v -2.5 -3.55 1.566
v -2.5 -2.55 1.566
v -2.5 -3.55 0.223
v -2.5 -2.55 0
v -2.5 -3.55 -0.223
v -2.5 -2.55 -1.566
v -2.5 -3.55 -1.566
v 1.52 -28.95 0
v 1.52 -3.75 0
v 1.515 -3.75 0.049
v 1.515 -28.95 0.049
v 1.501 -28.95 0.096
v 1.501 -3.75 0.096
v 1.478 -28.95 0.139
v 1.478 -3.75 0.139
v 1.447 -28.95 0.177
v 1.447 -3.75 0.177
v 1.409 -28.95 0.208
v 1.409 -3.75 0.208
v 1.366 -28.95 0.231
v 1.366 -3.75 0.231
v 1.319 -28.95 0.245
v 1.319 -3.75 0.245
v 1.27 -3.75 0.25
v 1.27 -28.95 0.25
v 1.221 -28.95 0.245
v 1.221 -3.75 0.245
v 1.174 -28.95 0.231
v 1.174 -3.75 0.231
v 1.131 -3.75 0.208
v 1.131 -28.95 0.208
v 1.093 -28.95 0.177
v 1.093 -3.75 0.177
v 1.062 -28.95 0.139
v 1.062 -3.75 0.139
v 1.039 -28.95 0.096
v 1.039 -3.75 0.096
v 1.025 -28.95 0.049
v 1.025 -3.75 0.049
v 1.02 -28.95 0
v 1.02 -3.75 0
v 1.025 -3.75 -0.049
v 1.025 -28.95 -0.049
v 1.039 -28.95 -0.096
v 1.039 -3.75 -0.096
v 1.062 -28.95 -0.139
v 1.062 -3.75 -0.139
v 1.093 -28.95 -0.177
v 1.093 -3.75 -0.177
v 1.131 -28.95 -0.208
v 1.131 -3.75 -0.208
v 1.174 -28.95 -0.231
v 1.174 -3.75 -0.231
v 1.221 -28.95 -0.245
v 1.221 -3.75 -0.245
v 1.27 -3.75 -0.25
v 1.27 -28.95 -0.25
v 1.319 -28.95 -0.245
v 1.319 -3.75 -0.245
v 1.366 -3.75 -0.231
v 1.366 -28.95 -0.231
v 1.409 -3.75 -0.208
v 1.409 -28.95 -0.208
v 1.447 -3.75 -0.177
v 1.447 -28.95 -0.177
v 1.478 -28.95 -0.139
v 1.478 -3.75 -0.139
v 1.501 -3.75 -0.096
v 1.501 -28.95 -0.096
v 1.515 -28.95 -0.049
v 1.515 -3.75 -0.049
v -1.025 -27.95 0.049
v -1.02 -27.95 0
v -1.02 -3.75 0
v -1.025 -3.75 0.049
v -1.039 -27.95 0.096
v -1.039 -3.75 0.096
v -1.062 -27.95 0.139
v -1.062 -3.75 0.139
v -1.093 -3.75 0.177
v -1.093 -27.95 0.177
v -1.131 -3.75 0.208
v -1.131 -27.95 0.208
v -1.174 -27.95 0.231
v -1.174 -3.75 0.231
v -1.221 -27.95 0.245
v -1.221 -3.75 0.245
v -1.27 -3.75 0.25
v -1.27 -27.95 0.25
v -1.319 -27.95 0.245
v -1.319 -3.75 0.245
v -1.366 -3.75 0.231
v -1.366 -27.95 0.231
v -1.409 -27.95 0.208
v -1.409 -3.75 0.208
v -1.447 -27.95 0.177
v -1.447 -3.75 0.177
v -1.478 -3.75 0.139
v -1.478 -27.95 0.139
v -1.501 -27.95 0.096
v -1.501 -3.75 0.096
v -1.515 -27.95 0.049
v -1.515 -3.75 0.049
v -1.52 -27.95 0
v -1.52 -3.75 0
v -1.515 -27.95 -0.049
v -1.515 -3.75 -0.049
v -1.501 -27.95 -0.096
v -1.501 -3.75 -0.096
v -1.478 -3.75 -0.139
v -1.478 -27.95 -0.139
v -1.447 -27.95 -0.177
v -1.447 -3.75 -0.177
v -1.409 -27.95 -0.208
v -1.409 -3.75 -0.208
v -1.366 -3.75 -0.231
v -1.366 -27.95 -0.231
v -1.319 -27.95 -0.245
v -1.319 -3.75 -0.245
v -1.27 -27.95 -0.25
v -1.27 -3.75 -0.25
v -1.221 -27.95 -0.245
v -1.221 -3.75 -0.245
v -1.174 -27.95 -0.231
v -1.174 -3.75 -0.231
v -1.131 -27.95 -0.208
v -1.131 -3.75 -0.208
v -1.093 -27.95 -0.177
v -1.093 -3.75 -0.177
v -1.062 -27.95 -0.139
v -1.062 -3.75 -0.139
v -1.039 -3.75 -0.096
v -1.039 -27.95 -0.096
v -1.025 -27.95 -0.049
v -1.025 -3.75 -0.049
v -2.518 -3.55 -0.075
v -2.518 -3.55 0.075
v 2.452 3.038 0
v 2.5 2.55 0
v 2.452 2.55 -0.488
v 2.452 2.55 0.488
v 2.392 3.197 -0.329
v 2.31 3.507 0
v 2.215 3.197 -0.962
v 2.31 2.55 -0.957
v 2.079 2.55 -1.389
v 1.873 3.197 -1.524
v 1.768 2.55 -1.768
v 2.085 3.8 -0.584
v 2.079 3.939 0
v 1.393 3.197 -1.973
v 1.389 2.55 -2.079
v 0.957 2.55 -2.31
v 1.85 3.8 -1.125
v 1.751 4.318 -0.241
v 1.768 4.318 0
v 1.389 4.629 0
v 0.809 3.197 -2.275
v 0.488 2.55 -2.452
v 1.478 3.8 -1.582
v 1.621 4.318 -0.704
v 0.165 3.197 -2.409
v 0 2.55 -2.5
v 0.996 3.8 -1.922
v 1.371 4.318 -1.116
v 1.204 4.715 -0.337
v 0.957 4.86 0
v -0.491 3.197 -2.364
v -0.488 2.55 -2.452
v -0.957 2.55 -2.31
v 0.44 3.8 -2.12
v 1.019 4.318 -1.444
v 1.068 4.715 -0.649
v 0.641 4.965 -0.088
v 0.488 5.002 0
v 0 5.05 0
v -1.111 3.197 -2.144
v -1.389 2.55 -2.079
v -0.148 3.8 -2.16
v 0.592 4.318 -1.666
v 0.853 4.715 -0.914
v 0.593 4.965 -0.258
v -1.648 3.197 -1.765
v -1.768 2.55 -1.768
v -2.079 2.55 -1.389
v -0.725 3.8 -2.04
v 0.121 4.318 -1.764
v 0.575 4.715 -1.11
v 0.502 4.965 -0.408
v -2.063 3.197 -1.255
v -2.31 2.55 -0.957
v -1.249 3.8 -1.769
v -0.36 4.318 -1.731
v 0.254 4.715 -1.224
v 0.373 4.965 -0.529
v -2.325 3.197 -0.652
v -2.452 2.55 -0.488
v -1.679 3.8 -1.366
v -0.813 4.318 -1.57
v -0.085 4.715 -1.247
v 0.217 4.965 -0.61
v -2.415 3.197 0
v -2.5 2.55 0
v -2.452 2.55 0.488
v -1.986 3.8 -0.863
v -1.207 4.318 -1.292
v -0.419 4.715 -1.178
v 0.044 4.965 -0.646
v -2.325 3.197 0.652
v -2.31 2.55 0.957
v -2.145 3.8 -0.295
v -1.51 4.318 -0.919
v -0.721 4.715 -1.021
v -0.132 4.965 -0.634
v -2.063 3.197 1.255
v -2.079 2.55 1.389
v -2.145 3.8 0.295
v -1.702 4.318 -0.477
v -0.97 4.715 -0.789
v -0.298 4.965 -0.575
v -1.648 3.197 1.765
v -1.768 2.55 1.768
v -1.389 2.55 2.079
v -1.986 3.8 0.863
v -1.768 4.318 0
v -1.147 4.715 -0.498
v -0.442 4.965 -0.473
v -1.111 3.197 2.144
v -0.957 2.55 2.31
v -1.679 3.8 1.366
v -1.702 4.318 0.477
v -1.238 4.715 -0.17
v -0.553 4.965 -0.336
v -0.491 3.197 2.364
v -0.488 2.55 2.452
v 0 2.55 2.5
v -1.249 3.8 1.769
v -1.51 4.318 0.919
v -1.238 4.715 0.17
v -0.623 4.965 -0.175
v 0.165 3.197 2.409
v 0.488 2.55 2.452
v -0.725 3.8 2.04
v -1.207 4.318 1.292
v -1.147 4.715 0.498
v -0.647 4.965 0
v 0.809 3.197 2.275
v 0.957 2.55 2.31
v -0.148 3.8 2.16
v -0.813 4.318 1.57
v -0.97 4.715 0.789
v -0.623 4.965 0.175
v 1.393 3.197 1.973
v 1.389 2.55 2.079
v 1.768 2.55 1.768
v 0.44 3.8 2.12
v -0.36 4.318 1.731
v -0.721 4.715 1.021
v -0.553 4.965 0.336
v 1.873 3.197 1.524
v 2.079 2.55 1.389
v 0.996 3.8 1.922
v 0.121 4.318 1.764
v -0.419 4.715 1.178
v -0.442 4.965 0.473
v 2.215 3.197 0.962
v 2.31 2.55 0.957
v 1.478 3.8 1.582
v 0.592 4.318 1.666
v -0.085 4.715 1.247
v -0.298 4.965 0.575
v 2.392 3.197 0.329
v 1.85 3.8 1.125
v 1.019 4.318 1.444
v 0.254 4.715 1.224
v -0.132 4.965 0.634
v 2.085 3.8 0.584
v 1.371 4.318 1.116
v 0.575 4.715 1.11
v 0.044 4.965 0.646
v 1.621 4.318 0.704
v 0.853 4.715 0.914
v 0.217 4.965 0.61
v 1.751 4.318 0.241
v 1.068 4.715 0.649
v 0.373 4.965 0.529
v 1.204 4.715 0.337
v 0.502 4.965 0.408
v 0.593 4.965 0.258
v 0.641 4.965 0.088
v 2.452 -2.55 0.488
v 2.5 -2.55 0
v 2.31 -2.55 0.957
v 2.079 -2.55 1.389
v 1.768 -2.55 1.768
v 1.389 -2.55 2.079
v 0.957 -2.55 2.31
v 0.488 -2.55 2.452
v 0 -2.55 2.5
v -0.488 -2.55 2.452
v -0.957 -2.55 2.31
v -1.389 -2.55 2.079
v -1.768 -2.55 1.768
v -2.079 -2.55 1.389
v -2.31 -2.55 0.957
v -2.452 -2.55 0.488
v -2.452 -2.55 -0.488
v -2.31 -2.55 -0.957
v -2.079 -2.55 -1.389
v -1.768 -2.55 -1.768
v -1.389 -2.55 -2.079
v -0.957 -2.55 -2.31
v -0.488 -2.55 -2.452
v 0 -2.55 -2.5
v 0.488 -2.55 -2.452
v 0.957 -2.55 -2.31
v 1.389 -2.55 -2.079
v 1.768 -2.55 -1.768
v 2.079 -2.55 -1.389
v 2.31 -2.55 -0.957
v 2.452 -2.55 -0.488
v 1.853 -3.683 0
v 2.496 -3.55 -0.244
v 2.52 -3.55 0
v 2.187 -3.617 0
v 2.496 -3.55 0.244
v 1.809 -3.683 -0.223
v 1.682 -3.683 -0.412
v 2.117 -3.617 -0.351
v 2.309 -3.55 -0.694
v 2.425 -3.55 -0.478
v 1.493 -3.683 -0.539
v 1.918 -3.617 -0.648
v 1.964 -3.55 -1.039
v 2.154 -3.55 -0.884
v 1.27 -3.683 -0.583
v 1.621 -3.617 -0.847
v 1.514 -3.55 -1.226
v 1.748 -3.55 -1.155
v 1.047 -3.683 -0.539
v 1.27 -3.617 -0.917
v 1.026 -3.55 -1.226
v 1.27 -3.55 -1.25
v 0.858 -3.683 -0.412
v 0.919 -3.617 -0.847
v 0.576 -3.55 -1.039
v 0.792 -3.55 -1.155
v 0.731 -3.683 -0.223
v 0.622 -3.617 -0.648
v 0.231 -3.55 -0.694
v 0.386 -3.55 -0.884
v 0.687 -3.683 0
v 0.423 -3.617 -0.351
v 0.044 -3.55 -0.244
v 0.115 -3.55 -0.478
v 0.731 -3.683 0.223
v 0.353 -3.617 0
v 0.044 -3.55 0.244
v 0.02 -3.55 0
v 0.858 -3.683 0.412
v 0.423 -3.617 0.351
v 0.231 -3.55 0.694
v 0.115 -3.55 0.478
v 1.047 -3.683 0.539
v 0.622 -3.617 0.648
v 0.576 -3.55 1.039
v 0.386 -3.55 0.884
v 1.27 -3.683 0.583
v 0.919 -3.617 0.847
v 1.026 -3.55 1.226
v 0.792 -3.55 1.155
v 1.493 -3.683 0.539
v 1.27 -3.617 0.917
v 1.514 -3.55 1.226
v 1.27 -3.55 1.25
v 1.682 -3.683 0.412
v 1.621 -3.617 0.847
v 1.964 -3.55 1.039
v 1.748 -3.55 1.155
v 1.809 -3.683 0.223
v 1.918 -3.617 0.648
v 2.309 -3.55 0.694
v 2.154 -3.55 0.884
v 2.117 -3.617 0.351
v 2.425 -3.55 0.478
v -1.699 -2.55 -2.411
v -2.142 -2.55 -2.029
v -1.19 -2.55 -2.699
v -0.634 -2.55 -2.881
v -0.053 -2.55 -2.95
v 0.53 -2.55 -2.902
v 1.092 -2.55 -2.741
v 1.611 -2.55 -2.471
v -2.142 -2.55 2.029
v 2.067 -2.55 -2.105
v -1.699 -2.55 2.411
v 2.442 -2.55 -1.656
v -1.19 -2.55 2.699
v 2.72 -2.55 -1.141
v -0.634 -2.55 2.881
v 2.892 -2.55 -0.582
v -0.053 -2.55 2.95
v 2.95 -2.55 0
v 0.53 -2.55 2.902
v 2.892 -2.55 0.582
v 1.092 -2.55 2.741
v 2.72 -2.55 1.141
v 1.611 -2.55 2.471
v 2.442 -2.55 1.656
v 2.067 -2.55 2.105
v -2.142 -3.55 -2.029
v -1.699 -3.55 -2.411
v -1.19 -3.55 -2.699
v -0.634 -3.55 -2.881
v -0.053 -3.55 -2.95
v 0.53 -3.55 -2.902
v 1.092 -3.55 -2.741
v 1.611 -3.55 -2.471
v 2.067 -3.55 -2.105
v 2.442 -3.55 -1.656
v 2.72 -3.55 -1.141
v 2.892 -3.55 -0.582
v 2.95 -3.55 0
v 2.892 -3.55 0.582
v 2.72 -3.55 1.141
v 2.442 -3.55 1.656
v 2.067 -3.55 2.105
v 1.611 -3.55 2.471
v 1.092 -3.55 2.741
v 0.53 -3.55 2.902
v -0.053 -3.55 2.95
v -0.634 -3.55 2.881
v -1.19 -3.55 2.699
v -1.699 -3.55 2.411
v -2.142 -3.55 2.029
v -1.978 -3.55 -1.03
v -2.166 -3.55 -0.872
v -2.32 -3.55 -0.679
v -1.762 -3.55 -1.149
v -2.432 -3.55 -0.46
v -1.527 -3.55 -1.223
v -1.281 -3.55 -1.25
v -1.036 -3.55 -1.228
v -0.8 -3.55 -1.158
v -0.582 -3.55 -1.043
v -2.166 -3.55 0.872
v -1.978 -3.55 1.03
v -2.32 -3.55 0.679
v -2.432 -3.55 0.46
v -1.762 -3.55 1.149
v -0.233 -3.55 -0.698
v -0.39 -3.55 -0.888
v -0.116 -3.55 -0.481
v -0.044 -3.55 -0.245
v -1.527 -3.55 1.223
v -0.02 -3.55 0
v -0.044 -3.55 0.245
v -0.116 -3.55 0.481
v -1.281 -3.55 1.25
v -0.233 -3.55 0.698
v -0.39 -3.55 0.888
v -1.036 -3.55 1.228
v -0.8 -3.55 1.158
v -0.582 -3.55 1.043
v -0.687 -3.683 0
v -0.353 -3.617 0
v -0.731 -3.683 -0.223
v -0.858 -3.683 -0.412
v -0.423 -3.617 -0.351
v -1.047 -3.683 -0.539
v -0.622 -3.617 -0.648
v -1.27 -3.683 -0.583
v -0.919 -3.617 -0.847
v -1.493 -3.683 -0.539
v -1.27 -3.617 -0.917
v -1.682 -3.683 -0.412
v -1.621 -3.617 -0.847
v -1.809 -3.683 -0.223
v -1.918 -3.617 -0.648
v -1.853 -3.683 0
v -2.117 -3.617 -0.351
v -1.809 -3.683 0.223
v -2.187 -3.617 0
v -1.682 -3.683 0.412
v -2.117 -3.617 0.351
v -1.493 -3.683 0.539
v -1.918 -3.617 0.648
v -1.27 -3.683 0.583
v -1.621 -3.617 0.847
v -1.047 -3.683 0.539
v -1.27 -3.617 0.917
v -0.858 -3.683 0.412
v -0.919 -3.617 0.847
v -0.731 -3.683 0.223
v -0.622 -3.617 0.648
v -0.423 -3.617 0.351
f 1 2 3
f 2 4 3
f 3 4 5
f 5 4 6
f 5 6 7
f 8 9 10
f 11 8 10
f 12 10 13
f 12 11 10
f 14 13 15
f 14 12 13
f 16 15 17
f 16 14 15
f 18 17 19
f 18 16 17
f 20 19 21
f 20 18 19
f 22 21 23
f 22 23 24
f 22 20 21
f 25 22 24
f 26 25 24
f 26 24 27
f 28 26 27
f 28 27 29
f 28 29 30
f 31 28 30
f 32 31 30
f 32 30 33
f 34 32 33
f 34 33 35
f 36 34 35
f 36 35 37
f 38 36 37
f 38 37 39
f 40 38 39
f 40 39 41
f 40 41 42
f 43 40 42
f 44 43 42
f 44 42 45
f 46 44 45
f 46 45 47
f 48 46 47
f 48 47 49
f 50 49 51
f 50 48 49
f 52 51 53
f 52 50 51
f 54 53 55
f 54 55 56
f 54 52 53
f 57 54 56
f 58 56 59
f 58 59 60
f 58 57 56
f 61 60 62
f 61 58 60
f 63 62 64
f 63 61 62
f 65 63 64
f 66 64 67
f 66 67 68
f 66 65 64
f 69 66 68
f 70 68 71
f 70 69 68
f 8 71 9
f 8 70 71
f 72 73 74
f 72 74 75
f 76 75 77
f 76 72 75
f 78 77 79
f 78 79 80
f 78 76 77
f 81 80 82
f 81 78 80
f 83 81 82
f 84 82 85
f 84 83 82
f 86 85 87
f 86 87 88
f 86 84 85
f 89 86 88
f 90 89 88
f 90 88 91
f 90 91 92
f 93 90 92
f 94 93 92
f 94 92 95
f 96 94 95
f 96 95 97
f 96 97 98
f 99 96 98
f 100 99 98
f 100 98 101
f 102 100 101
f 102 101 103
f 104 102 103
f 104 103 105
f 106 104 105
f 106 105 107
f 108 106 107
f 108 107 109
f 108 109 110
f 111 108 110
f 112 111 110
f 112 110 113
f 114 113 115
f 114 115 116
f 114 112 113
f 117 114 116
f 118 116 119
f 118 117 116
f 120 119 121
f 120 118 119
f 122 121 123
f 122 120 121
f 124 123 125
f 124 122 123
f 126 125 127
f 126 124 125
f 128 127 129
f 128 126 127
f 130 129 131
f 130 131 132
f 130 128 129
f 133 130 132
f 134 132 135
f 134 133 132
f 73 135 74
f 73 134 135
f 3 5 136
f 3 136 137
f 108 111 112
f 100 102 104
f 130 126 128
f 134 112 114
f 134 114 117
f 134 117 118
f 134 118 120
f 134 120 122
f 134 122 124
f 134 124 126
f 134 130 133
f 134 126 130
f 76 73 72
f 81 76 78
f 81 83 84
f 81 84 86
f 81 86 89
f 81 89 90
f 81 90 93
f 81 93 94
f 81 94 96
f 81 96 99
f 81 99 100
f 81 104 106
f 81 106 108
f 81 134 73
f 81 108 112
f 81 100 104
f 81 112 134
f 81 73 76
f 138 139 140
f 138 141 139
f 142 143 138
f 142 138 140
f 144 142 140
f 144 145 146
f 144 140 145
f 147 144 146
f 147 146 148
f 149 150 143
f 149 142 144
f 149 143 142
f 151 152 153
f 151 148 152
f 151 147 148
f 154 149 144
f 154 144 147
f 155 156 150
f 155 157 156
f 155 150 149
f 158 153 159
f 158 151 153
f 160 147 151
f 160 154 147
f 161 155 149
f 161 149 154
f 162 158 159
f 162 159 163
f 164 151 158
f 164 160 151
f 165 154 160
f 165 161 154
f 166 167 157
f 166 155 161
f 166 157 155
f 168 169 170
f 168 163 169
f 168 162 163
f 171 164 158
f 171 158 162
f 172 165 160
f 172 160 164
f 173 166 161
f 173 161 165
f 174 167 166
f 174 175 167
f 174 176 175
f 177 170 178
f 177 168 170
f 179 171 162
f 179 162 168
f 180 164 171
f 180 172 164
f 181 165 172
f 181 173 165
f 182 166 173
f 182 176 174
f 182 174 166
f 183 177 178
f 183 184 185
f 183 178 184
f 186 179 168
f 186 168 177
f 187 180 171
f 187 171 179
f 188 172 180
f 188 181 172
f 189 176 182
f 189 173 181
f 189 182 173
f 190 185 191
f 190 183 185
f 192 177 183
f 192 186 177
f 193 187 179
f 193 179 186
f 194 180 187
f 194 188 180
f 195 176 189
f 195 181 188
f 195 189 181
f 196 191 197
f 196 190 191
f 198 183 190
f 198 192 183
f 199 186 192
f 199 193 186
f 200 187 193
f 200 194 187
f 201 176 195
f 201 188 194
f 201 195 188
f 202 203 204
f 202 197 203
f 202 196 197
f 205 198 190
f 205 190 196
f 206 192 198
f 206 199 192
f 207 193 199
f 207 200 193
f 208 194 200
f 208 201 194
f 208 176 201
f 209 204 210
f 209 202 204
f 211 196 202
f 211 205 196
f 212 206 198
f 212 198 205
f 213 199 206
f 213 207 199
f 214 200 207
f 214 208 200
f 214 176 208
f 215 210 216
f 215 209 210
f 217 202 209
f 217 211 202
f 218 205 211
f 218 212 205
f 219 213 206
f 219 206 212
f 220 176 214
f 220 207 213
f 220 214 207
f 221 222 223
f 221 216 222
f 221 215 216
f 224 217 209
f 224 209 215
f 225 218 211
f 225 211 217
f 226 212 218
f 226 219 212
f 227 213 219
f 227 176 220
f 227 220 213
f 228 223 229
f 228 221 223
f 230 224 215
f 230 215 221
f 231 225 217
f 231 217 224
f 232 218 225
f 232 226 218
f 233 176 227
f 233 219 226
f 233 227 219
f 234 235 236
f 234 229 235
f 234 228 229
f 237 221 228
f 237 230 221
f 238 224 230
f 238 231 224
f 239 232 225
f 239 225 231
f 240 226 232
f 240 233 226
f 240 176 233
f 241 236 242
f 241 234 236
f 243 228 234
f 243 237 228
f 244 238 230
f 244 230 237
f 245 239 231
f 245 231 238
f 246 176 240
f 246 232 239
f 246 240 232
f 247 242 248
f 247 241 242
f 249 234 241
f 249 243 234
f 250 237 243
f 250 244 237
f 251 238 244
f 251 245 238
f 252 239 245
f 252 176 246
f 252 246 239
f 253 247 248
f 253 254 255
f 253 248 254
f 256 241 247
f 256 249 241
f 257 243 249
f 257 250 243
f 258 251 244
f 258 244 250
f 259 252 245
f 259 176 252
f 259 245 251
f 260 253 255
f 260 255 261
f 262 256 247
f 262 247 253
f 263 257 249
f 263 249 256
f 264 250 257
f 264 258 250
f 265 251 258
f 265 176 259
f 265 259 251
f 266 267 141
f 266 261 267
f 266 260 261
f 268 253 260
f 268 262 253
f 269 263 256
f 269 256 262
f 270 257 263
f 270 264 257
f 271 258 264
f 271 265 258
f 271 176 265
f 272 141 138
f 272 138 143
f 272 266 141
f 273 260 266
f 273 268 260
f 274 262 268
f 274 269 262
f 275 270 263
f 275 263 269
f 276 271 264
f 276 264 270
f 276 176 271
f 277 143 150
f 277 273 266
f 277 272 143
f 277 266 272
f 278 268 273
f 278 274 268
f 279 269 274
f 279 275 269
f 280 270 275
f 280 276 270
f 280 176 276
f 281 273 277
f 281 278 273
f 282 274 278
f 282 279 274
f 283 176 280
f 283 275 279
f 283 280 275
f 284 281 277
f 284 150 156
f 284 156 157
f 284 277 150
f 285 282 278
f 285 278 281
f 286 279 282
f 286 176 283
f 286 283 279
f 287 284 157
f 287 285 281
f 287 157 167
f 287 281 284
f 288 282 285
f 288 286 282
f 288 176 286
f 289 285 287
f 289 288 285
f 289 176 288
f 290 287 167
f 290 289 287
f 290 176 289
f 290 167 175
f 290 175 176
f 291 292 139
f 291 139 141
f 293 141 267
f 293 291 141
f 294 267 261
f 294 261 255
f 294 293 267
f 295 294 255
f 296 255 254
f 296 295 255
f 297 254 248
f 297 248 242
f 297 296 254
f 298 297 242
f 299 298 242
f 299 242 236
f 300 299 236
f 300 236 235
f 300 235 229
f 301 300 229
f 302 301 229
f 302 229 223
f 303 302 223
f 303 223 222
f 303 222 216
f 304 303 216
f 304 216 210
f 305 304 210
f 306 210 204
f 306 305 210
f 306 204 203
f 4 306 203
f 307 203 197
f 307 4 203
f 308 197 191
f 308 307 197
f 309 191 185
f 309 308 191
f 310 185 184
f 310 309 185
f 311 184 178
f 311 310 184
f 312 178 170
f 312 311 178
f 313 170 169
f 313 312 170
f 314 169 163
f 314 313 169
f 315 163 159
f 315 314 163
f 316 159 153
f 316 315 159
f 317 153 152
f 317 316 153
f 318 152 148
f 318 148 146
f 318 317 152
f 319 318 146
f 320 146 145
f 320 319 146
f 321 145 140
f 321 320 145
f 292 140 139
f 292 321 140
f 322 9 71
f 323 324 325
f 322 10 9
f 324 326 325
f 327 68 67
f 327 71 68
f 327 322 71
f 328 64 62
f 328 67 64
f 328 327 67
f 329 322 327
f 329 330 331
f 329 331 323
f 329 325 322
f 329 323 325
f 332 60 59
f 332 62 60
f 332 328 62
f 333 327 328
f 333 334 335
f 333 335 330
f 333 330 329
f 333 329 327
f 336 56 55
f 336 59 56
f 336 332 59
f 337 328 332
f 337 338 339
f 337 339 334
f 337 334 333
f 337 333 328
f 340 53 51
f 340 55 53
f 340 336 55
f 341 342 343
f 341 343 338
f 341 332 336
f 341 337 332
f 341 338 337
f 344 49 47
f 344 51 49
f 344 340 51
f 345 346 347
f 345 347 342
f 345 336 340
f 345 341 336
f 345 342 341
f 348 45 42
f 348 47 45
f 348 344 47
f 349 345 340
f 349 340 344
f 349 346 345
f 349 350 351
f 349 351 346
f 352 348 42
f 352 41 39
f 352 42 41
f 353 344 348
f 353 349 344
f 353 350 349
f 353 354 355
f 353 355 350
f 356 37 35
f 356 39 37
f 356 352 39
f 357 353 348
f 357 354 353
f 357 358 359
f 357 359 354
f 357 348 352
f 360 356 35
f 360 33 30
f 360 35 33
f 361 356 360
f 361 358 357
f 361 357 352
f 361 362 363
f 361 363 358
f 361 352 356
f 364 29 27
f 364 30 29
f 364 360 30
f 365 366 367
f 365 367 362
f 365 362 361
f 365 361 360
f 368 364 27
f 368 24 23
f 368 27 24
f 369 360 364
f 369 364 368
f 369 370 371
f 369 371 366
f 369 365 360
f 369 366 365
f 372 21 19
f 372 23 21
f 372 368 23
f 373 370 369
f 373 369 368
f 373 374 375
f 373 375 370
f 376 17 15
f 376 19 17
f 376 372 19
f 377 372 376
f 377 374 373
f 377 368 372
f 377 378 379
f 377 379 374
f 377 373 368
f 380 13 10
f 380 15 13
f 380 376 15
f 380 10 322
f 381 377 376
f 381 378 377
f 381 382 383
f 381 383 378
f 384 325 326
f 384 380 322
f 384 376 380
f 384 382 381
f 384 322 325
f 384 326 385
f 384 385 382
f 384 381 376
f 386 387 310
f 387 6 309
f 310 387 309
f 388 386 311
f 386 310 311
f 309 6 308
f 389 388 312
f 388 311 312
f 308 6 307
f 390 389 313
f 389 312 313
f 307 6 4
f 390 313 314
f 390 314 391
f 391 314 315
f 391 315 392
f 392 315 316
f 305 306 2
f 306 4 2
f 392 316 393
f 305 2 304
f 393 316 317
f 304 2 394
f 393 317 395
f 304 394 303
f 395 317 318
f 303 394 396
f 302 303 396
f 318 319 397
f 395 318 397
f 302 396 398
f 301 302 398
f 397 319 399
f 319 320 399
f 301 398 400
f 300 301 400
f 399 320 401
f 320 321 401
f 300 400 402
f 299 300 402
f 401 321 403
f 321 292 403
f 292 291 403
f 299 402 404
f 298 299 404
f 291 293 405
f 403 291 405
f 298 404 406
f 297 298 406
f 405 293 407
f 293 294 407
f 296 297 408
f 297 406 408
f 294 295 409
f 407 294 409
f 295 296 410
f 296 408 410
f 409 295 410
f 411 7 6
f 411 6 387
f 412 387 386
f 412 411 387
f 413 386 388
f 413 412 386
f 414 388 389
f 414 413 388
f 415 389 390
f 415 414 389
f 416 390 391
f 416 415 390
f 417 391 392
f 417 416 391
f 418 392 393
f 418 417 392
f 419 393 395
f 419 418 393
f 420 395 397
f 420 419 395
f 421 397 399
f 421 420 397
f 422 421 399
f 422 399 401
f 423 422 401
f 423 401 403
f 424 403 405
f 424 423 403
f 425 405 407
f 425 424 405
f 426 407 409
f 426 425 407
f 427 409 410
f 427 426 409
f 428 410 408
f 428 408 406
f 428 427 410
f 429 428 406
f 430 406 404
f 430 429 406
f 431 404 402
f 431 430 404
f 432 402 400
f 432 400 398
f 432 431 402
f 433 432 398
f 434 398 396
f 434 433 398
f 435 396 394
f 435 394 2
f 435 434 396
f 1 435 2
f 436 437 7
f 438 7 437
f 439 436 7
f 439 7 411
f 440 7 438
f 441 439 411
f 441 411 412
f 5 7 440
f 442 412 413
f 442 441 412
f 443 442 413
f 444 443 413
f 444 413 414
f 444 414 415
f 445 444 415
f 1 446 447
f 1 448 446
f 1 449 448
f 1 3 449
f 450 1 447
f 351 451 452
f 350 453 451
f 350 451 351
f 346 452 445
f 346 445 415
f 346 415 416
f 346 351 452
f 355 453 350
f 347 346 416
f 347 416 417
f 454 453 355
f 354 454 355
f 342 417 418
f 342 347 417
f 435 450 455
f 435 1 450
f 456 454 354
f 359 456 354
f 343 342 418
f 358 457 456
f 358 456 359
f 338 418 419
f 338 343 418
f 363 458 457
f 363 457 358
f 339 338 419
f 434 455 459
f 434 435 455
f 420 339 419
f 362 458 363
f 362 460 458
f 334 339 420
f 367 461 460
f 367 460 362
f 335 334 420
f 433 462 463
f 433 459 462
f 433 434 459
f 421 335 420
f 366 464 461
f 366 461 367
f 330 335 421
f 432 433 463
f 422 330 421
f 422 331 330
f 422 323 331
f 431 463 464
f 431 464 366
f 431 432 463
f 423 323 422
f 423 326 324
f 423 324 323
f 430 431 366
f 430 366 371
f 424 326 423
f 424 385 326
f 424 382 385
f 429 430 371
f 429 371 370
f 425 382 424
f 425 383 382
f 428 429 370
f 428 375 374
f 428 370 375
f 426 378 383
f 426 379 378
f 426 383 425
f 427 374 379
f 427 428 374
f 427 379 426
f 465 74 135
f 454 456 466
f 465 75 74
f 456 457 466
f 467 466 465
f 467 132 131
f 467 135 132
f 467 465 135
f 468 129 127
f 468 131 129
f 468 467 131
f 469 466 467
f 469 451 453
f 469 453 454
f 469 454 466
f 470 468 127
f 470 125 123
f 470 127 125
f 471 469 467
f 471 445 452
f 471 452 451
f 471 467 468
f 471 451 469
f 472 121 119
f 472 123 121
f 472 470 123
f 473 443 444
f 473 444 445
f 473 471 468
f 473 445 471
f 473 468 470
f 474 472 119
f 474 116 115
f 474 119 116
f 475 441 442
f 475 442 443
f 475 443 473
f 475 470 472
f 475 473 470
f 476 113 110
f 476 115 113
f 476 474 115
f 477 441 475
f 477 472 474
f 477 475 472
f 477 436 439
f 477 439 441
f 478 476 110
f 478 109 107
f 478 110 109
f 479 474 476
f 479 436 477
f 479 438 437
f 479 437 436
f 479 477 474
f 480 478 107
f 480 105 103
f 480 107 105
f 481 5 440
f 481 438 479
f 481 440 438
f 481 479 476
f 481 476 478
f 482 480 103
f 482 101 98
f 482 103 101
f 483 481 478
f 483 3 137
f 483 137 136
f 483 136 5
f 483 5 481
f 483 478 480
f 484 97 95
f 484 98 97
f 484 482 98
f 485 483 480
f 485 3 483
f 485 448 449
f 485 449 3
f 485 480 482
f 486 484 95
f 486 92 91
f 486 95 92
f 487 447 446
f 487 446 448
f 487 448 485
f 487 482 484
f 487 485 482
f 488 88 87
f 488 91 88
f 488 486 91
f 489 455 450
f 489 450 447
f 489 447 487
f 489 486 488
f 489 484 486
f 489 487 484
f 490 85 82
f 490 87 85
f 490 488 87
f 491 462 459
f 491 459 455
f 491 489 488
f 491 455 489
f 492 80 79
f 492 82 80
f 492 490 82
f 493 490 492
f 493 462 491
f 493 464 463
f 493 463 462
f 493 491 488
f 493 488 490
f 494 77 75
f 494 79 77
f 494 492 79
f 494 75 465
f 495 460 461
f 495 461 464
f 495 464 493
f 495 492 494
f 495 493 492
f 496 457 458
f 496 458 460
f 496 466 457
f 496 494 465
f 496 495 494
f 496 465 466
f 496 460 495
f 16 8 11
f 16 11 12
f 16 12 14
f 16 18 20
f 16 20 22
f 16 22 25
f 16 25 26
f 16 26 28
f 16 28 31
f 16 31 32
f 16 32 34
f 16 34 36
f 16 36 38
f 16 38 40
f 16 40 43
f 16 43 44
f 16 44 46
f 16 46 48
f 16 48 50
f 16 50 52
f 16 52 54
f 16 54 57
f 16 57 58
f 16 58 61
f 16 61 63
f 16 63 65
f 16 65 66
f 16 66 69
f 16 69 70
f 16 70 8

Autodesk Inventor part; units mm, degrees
ref_plane "YZ Plane" through (0, 0, 0) normal (1, 0, 0) x (0, 1, 0)
sketch "Sketch1" plane through (0, 0, 0) normal (0, 0, 1) x (1, 0, 0)
  line L0 (2.5, -2.55) -> (-2.5, -2.55)
  line L1 (-2.5, -2.55) -> (-2.5, 2.55)
  line L2 (-2.5, 2.55) -> (2.5, 2.55)
  line L3 (2.5, 2.55) -> (2.5, -2.55)
  line L4 (2.5, -2.55) -> (-2.5, 2.55) construction
  line L5 (-2.5, -2.55) -> (2.5, 2.55) construction
  arc A0 (2.5, 2.55) -> (-2.5, 2.55) centre (0, 2.55) ccw
  line L6 (-2.95, -2.55) -> (2.95, -2.55)
  line L7 (2.95, -2.55) -> (2.95, -3.55)
  line L8 (2.95, -3.55) -> (-2.95, -3.55)
  line L9 (-2.95, -3.55) -> (-2.95, -2.55)
  line L10 (0, 5.05) -> (0, -3.55)
  point P0 (0, 0)
  point P1 (0, -2.55)
  point P2 (0, -2.55)
  dimension "d0" = 5
  dimension "d1" = 1
  dimension "d2" = 5.9
  dimension "d3" = 8.6
revolve "Revolution1" add sketch "Sketch1" angle 360 about axis through (0, 5.05, 0) along (0, -1, 0) picked at (1.5632, 3.097) contours L6 L7 L8 L10 L0 | L0 L10 L2 L3 | L2 L10 A0
sketch "Sketch2" plane through (0, 0, 0) normal (0, 0, 1) x (1, 0, 0)
  line L0 (-2.95, -3.55) -> (2.95, -3.55) projected
  line L1 (-1.27, -3.55) -> (-1.27, -27.95)
  line L2 (1.27, -3.55) -> (1.27, -28.95)
  line L3 (-2.95, -2.55) -> (-2.95, -3.55) projected
  line L4 (-2.95, -2.55) -> (2.95, -2.55) projected
  line L5 (-2.5, 2.55) -> (-2.5, -2.55) projected
  line L6 (-2.5, -2.55) -> (-2.5, -3.55)
  point P0 (0, 0)
  point P1 (0, -3.55)
  dimension "d5" = 2.54
  dimension "d6" = 1.27
  dimension "d7" = 25.4
  dimension "d8" = 1
ref_plane "Work Plane1" through (1.27, -28.95, 0) normal (0, -1, 0) x (1, 0, 0)
ref_plane "Work Plane2" through (-1.27, -27.95, 0) normal (0, -1, 0) x (1, 0, 0)
sketch "Sketch3" plane through (1.27, -28.95, 0) normal (0, -1, 0) x (1, 0, 0)
  circle A0 centre (0, 0) radius 0.25
  circle A1 centre (-2.54, 0) radius 0.25
  point P0 (-1.27, 0)
  dimension "d9" = 0.5
extrude "Extrusion1" add sketch "Sketch3" against normal up to surface (25.4 mm away) contours A0
extrude "Extrusion2" add sketch "Sketch3" against normal up to surface (24.4 mm away) from surface at -1 contours A1
chamfer "Chamfer1" distance 1 distance2 0.2 1 edges at (-1.52, -3.55, 0) measured on face at (0.1185, -3.55, -1.0867)
chamfer "Chamfer2" distance 1 distance2 0.2 1 edges at (1.02, -3.55, 0) measured on face at (0.8409, -3.55, -1.1635)
extrude "Extrusion3" cut sketch "Sketch2" along normal through all both and the other way through all
equation "\"d6\" = 0.5 * d5"
properties part number "5mm_LED_Red"
